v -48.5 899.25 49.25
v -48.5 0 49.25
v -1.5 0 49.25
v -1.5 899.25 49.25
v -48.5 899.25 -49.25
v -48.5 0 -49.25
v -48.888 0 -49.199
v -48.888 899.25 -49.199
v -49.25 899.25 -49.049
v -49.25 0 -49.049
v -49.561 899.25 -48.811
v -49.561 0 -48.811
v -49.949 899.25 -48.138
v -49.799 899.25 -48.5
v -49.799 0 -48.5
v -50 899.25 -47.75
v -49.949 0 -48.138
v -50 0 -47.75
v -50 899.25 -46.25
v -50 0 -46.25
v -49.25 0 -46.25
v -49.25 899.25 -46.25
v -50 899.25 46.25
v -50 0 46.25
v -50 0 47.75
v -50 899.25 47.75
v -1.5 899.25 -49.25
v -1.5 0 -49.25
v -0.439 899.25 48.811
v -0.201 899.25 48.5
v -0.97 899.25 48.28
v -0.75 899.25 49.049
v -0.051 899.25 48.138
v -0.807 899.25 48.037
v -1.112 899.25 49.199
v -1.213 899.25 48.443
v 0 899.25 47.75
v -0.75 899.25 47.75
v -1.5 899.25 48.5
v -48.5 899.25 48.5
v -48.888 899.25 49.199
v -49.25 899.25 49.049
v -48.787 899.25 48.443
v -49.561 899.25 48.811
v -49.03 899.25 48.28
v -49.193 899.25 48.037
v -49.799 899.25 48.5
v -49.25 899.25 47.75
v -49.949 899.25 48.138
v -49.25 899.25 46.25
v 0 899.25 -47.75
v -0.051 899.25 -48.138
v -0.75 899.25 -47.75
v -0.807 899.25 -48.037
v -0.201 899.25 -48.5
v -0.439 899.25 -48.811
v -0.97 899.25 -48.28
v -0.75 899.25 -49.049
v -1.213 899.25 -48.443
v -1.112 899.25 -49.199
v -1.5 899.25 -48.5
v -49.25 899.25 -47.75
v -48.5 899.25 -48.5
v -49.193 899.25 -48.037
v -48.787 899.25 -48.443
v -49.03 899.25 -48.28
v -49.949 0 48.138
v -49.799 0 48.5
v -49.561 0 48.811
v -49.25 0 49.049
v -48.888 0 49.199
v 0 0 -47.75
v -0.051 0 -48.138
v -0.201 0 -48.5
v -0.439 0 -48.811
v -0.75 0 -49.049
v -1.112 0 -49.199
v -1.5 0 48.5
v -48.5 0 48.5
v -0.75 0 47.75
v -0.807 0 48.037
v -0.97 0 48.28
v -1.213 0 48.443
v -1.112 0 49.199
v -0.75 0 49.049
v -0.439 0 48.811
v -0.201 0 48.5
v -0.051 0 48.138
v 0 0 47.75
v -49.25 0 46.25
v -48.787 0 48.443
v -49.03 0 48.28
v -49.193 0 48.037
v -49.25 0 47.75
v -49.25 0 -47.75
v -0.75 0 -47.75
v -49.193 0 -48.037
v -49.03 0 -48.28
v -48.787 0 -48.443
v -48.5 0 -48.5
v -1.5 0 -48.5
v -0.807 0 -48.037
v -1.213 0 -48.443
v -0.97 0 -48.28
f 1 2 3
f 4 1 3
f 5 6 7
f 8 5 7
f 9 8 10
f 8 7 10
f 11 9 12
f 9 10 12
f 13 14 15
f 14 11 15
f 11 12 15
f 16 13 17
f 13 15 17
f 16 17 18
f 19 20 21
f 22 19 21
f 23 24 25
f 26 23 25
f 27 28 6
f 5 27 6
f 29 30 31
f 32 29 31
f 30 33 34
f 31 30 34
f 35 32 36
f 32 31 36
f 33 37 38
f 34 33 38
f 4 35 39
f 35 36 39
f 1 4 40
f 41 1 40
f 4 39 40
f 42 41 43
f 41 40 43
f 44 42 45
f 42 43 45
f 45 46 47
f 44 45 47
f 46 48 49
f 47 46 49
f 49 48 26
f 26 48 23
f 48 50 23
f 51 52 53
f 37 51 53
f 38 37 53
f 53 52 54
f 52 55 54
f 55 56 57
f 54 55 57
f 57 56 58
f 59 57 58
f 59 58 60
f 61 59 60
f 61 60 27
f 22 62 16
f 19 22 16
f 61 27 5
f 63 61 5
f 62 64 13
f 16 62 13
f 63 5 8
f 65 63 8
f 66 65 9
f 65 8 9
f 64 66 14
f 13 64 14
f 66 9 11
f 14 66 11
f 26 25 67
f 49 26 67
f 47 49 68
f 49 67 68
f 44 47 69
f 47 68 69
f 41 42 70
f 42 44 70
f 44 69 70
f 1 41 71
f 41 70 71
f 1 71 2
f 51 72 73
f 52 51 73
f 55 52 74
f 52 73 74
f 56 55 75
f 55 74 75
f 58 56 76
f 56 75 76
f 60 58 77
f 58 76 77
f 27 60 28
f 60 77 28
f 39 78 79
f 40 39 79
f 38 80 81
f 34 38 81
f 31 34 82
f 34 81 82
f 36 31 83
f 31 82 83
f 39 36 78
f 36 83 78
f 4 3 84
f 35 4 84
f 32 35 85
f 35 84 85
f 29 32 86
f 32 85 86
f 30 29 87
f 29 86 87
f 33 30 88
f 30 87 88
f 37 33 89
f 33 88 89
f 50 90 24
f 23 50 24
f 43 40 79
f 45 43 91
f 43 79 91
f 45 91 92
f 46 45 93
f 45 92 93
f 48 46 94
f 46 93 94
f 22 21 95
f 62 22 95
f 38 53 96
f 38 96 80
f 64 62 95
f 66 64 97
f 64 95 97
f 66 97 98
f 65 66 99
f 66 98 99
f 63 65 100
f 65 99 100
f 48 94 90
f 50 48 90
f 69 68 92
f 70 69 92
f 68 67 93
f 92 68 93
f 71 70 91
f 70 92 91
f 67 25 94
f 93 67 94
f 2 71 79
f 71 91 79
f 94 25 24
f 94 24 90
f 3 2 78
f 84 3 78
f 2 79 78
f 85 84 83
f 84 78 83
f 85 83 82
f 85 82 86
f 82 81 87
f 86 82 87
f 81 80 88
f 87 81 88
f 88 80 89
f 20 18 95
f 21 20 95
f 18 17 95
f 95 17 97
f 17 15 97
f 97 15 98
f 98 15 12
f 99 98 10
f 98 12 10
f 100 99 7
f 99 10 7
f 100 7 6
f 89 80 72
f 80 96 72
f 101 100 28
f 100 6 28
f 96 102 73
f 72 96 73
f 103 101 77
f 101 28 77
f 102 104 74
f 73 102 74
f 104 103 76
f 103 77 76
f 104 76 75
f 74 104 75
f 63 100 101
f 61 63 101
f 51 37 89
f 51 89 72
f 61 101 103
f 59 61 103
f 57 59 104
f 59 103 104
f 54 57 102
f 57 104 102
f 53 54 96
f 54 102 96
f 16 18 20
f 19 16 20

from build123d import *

# Parameters (mm, degrees)
MOVE_BODY_2_DEPTH    = 3000
SKETCH_6_OUTSIDE_W   = 652.406
SKETCH_6_OUTSIDE_H   = 3602.406
SKETCH_6_OUTSIDE_W_2 = 50
SKETCH_6_OUTSIDE_H_2 = 899.25
CUT_EXTRUDE_1_DEPTH  = 3003.033019472


# Read off the part's stored shape, not the designer's step: Тело-Переместить/Копировать2
with BuildPart() as part:
    # Move Body 2 outline → Move Body 2 (new body)
    with BuildSketch(Plane(origin=(0, 0, 0), x_dir=(1, 0, 0), z_dir=(0, 1, 0))):
        with BuildLine():
            Line((-50, 47.75), (-50, 46.25))
            Line((-50, 46.25), (-49.25, 46.25))
            Line((-49.25, 46.25), (-49.25, 47.75))
            ThreePointArc((-49.25, 47.75), (-49.030330086, 48.280330086), (-48.5, 48.5))
            Line((-48.5, 48.5), (-1.5, 48.5))
            ThreePointArc((-1.5, 48.5), (-0.969669914, 48.280330086), (-0.75, 47.75))
            Line((-0.75, 47.75), (-0.75, -47.75))
            ThreePointArc((-0.75, -47.75), (-0.969669914, -48.280330086), (-1.5, -48.5))
            Line((-1.5, -48.5), (-48.5, -48.5))
            ThreePointArc((-48.5, -48.5), (-49.030330086, -48.280330086), (-49.25, -47.75))
            Line((-49.25, -47.75), (-49.25, -46.25))
            Line((-49.25, -46.25), (-50, -46.25))
            Line((-50, -46.25), (-50, -47.75))
            ThreePointArc((-50, -47.75), (-49.560660172, -48.810660172), (-48.5, -49.25))
            Line((-48.5, -49.25), (-1.5, -49.25))
            ThreePointArc((-1.5, -49.25), (-0.439339828, -48.810660172), (0, -47.75))
            Line((0, -47.75), (0, 47.75))
            ThreePointArc((0, 47.75), (-0.439339828, 48.810660172), (-1.5, 49.25))
            Line((-1.5, 49.25), (-48.5, 49.25))
            ThreePointArc((-48.5, 49.25), (-49.560660172, 48.810660172), (-50, 47.75))
        make_face()
    extrude(amount=MOVE_BODY_2_DEPTH)

    # Эскиз6 outside → Вырез-Вытянуть1 (cut, through all)
    with BuildSketch(Plane(origin=(0, 0, -49.25), x_dir=(-1, 0, 0), z_dir=(0, 0, -1))):
        with Locations((25, 1500)):
            Rectangle(SKETCH_6_OUTSIDE_W, SKETCH_6_OUTSIDE_H)
        with Locations((25, 449.625)):
            Rectangle(SKETCH_6_OUTSIDE_W_2, SKETCH_6_OUTSIDE_H_2, mode=Mode.SUBTRACT)
    extrude(amount=-CUT_EXTRUDE_1_DEPTH, mode=Mode.SUBTRACT)


solid = part.part
